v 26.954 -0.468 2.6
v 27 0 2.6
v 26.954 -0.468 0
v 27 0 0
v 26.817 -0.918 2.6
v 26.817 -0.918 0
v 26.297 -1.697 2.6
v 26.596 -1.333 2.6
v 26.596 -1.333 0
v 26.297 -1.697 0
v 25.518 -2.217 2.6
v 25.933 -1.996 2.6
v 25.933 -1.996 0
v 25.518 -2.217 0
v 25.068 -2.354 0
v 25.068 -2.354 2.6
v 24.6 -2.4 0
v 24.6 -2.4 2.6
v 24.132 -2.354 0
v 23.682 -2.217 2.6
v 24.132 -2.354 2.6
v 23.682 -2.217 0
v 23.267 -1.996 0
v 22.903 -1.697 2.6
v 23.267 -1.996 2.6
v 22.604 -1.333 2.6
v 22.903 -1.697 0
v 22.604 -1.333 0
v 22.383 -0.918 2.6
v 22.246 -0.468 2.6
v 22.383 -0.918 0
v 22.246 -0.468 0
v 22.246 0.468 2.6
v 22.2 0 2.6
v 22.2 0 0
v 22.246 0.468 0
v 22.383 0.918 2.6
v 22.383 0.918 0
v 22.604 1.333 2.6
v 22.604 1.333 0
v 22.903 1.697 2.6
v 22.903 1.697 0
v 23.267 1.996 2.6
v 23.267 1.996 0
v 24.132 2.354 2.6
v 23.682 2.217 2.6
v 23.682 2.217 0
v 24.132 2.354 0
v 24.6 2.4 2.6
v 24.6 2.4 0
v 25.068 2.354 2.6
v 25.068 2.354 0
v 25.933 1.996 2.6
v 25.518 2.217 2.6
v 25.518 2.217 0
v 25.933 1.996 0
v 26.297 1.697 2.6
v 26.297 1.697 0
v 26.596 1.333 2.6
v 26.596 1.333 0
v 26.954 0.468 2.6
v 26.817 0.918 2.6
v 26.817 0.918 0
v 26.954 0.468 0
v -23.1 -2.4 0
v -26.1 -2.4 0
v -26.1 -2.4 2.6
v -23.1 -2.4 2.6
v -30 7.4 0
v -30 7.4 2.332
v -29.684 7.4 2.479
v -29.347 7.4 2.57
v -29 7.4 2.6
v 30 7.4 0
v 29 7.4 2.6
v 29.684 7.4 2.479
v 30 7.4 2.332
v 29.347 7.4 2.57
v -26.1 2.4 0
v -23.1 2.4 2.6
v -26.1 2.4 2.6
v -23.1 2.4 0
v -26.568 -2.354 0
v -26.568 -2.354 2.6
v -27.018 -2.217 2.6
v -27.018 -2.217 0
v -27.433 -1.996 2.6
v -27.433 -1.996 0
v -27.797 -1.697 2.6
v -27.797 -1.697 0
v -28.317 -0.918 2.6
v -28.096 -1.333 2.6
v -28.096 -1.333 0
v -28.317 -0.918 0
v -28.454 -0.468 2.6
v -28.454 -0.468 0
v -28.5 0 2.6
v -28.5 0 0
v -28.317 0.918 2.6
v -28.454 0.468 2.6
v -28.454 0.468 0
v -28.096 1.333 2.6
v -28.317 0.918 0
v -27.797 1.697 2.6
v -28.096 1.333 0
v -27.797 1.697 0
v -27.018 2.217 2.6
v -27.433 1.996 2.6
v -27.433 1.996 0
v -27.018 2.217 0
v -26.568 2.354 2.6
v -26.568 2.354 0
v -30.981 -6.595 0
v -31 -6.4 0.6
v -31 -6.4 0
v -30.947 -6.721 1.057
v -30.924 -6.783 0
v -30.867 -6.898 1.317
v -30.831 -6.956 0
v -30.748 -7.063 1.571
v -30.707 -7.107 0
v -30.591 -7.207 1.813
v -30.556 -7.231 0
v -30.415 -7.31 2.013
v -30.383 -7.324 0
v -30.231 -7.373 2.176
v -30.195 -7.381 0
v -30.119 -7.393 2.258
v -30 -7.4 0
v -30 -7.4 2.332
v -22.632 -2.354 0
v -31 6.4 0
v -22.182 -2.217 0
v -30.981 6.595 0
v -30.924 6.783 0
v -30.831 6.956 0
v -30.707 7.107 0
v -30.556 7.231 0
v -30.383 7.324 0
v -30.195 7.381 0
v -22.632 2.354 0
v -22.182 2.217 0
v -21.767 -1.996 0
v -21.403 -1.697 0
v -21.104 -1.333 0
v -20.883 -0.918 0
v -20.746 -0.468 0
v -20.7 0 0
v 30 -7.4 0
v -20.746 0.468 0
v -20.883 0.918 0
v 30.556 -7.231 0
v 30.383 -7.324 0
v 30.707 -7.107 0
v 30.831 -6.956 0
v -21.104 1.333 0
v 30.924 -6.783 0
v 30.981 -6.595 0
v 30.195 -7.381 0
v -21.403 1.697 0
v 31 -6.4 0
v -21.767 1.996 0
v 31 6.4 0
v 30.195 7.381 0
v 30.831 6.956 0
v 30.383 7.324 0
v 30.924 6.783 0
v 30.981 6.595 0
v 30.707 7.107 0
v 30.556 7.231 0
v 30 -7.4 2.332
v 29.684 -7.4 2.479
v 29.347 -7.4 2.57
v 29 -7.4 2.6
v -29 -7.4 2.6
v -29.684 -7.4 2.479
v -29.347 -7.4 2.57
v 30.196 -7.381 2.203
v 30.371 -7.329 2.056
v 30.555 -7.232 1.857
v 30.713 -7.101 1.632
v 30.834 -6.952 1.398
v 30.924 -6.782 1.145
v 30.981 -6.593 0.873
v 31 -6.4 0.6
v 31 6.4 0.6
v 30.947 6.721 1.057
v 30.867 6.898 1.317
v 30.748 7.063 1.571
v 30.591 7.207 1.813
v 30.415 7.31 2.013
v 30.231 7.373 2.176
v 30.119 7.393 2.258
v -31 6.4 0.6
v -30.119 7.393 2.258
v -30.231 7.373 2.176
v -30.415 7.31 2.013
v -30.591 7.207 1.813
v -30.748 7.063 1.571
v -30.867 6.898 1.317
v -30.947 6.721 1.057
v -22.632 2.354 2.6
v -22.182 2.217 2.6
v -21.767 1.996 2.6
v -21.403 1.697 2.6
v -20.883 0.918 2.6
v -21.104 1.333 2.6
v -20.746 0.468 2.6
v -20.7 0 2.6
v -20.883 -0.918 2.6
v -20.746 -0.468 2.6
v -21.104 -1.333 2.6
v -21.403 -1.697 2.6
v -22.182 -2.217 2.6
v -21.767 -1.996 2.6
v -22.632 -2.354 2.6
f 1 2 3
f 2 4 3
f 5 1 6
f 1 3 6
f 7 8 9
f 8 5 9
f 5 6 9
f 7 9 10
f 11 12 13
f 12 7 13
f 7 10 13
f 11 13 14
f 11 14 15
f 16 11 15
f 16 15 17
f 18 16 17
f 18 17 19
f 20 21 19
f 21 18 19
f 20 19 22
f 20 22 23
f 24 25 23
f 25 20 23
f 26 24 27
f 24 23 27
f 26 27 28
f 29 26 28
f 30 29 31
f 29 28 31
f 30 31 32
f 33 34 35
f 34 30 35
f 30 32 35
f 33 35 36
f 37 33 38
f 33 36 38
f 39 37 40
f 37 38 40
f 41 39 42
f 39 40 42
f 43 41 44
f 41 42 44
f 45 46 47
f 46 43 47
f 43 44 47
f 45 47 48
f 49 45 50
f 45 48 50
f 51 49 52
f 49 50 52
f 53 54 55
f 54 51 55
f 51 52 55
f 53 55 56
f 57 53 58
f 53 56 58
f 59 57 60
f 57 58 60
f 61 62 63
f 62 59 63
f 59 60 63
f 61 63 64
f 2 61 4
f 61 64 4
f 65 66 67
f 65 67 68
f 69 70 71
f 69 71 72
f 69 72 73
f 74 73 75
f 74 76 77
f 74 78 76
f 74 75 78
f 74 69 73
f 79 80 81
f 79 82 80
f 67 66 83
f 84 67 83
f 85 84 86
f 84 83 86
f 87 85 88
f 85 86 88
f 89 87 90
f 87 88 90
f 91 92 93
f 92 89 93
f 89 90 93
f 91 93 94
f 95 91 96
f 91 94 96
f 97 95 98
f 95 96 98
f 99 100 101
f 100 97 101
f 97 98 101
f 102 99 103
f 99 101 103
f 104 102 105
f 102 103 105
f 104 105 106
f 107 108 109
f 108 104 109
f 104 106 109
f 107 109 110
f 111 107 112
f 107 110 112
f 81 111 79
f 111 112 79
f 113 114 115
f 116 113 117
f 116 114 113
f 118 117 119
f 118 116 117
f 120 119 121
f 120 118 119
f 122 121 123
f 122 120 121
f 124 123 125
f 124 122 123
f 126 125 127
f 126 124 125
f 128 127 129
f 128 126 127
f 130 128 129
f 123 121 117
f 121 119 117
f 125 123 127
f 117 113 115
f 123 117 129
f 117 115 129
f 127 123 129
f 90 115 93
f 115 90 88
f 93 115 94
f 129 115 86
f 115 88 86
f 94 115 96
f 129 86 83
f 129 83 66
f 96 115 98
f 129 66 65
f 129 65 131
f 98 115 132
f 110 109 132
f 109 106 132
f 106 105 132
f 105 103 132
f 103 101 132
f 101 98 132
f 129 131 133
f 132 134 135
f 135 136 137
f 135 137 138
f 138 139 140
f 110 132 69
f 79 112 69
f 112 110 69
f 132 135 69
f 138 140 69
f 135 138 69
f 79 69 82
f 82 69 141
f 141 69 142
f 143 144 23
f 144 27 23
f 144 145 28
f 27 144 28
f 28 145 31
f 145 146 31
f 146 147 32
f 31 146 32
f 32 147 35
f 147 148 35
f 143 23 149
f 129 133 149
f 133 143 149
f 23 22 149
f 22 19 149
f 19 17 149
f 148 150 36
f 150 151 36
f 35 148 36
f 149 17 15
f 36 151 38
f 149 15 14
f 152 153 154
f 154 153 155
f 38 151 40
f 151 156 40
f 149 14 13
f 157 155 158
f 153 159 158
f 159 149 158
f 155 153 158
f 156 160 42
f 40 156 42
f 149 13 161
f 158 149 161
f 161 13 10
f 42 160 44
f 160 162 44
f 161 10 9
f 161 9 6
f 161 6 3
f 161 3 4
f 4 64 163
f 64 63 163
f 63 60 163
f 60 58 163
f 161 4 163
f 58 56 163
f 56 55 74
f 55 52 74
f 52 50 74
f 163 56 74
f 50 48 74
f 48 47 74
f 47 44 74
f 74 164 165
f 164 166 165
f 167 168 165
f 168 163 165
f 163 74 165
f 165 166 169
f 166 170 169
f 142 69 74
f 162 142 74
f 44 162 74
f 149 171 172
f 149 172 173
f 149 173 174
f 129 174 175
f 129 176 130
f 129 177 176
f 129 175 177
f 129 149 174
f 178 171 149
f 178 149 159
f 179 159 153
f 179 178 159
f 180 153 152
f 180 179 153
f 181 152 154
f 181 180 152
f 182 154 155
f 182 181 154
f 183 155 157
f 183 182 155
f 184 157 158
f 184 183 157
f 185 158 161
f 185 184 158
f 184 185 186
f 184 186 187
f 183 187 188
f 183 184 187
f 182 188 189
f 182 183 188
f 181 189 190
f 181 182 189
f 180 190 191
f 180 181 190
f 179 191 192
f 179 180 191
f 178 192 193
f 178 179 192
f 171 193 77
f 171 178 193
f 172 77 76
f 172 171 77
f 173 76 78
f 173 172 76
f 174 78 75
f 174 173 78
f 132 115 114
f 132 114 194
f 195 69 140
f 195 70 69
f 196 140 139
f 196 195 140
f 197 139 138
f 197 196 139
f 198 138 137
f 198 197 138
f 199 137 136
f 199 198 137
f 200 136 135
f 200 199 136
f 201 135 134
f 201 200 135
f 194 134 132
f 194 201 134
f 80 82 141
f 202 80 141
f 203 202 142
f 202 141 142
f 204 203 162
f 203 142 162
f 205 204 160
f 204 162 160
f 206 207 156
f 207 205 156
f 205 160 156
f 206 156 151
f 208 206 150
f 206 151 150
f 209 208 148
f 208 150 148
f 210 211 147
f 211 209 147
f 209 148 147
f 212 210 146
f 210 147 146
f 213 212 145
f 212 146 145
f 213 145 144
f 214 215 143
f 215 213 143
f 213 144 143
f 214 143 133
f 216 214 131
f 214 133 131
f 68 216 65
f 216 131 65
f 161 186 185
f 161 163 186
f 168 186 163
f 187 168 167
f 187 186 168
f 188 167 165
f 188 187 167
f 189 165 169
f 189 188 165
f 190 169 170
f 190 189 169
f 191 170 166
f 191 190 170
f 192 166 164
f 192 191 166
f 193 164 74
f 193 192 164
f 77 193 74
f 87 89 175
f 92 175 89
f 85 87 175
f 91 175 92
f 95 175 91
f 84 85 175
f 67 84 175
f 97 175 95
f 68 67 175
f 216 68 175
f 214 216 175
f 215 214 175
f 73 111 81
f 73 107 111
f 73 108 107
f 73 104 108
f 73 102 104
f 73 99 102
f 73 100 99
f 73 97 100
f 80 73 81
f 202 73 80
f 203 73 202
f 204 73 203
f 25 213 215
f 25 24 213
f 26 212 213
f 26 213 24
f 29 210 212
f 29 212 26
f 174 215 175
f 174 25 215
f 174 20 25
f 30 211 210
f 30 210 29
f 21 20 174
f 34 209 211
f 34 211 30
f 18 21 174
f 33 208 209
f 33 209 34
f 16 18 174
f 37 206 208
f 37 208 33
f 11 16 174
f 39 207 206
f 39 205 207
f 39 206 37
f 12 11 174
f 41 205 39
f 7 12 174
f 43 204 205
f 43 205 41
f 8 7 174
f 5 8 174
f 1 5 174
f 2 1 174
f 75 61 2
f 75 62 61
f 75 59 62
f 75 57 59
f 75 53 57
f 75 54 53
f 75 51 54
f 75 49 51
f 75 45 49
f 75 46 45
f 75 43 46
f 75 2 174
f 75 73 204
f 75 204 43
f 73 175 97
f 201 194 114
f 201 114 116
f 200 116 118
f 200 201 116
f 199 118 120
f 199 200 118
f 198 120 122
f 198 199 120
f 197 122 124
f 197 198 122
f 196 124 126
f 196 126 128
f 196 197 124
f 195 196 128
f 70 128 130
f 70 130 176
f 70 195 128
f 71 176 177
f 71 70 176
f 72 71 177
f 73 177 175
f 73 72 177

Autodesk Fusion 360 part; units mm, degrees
sketch "Sketch1" plane through (0, 0, 0) normal (0, 0, 1) x (1, 0, 0)
  line L0 (-31, 7.4) -> (31, 7.4)
  line L1 (31, 7.4) -> (31, -7.4)
  line L2 (31, -7.4) -> (-31, -7.4)
  line L3 (-31, -7.4) -> (-31, 7.4)
  line L4 (-31, 0) -> (31, 0) construction
  circle A0 centre (24.6, 0) radius 2.4
  line L5 (0, 7.4) -> (0, -7.4) construction
  circle A1 centre (-24.6, 0) radius 2.4 construction
  line L6 (-26.1, -2.4) -> (-23.1, -2.4)
  arc A2 (-23.1, -2.4) -> (-23.1, 2.4) centre (-23.1, 0) ccw
  line L7 (-23.1, 2.4) -> (-26.1, 2.4)
  arc A3 (-26.1, 2.4) -> (-26.1, -2.4) centre (-26.1, 0) ccw
  line L8 (-26.1, 0) -> (-23.1, 0) construction
  point P0 (-24.6, 0)
  dimension "d1" = 62
  dimension "d2" = 14.8
  dimension "d3" = 4.8
  dimension "d4" = 49.2
  dimension "d5" = 3
extrude "Extrude1" add sketch "Sketch1" along normal blind 2.6
fillet "Fillet2" radius 1 4 edges at (31, -7.4, 1.3) (31, 7.4, 1.3) (-31, 7.4, 1.3) (-31, -7.4, 1.3)
fillet "Fillet2" radius 2 2 edges at (31, 0, 2.6) (-31, 0, 2.6)
